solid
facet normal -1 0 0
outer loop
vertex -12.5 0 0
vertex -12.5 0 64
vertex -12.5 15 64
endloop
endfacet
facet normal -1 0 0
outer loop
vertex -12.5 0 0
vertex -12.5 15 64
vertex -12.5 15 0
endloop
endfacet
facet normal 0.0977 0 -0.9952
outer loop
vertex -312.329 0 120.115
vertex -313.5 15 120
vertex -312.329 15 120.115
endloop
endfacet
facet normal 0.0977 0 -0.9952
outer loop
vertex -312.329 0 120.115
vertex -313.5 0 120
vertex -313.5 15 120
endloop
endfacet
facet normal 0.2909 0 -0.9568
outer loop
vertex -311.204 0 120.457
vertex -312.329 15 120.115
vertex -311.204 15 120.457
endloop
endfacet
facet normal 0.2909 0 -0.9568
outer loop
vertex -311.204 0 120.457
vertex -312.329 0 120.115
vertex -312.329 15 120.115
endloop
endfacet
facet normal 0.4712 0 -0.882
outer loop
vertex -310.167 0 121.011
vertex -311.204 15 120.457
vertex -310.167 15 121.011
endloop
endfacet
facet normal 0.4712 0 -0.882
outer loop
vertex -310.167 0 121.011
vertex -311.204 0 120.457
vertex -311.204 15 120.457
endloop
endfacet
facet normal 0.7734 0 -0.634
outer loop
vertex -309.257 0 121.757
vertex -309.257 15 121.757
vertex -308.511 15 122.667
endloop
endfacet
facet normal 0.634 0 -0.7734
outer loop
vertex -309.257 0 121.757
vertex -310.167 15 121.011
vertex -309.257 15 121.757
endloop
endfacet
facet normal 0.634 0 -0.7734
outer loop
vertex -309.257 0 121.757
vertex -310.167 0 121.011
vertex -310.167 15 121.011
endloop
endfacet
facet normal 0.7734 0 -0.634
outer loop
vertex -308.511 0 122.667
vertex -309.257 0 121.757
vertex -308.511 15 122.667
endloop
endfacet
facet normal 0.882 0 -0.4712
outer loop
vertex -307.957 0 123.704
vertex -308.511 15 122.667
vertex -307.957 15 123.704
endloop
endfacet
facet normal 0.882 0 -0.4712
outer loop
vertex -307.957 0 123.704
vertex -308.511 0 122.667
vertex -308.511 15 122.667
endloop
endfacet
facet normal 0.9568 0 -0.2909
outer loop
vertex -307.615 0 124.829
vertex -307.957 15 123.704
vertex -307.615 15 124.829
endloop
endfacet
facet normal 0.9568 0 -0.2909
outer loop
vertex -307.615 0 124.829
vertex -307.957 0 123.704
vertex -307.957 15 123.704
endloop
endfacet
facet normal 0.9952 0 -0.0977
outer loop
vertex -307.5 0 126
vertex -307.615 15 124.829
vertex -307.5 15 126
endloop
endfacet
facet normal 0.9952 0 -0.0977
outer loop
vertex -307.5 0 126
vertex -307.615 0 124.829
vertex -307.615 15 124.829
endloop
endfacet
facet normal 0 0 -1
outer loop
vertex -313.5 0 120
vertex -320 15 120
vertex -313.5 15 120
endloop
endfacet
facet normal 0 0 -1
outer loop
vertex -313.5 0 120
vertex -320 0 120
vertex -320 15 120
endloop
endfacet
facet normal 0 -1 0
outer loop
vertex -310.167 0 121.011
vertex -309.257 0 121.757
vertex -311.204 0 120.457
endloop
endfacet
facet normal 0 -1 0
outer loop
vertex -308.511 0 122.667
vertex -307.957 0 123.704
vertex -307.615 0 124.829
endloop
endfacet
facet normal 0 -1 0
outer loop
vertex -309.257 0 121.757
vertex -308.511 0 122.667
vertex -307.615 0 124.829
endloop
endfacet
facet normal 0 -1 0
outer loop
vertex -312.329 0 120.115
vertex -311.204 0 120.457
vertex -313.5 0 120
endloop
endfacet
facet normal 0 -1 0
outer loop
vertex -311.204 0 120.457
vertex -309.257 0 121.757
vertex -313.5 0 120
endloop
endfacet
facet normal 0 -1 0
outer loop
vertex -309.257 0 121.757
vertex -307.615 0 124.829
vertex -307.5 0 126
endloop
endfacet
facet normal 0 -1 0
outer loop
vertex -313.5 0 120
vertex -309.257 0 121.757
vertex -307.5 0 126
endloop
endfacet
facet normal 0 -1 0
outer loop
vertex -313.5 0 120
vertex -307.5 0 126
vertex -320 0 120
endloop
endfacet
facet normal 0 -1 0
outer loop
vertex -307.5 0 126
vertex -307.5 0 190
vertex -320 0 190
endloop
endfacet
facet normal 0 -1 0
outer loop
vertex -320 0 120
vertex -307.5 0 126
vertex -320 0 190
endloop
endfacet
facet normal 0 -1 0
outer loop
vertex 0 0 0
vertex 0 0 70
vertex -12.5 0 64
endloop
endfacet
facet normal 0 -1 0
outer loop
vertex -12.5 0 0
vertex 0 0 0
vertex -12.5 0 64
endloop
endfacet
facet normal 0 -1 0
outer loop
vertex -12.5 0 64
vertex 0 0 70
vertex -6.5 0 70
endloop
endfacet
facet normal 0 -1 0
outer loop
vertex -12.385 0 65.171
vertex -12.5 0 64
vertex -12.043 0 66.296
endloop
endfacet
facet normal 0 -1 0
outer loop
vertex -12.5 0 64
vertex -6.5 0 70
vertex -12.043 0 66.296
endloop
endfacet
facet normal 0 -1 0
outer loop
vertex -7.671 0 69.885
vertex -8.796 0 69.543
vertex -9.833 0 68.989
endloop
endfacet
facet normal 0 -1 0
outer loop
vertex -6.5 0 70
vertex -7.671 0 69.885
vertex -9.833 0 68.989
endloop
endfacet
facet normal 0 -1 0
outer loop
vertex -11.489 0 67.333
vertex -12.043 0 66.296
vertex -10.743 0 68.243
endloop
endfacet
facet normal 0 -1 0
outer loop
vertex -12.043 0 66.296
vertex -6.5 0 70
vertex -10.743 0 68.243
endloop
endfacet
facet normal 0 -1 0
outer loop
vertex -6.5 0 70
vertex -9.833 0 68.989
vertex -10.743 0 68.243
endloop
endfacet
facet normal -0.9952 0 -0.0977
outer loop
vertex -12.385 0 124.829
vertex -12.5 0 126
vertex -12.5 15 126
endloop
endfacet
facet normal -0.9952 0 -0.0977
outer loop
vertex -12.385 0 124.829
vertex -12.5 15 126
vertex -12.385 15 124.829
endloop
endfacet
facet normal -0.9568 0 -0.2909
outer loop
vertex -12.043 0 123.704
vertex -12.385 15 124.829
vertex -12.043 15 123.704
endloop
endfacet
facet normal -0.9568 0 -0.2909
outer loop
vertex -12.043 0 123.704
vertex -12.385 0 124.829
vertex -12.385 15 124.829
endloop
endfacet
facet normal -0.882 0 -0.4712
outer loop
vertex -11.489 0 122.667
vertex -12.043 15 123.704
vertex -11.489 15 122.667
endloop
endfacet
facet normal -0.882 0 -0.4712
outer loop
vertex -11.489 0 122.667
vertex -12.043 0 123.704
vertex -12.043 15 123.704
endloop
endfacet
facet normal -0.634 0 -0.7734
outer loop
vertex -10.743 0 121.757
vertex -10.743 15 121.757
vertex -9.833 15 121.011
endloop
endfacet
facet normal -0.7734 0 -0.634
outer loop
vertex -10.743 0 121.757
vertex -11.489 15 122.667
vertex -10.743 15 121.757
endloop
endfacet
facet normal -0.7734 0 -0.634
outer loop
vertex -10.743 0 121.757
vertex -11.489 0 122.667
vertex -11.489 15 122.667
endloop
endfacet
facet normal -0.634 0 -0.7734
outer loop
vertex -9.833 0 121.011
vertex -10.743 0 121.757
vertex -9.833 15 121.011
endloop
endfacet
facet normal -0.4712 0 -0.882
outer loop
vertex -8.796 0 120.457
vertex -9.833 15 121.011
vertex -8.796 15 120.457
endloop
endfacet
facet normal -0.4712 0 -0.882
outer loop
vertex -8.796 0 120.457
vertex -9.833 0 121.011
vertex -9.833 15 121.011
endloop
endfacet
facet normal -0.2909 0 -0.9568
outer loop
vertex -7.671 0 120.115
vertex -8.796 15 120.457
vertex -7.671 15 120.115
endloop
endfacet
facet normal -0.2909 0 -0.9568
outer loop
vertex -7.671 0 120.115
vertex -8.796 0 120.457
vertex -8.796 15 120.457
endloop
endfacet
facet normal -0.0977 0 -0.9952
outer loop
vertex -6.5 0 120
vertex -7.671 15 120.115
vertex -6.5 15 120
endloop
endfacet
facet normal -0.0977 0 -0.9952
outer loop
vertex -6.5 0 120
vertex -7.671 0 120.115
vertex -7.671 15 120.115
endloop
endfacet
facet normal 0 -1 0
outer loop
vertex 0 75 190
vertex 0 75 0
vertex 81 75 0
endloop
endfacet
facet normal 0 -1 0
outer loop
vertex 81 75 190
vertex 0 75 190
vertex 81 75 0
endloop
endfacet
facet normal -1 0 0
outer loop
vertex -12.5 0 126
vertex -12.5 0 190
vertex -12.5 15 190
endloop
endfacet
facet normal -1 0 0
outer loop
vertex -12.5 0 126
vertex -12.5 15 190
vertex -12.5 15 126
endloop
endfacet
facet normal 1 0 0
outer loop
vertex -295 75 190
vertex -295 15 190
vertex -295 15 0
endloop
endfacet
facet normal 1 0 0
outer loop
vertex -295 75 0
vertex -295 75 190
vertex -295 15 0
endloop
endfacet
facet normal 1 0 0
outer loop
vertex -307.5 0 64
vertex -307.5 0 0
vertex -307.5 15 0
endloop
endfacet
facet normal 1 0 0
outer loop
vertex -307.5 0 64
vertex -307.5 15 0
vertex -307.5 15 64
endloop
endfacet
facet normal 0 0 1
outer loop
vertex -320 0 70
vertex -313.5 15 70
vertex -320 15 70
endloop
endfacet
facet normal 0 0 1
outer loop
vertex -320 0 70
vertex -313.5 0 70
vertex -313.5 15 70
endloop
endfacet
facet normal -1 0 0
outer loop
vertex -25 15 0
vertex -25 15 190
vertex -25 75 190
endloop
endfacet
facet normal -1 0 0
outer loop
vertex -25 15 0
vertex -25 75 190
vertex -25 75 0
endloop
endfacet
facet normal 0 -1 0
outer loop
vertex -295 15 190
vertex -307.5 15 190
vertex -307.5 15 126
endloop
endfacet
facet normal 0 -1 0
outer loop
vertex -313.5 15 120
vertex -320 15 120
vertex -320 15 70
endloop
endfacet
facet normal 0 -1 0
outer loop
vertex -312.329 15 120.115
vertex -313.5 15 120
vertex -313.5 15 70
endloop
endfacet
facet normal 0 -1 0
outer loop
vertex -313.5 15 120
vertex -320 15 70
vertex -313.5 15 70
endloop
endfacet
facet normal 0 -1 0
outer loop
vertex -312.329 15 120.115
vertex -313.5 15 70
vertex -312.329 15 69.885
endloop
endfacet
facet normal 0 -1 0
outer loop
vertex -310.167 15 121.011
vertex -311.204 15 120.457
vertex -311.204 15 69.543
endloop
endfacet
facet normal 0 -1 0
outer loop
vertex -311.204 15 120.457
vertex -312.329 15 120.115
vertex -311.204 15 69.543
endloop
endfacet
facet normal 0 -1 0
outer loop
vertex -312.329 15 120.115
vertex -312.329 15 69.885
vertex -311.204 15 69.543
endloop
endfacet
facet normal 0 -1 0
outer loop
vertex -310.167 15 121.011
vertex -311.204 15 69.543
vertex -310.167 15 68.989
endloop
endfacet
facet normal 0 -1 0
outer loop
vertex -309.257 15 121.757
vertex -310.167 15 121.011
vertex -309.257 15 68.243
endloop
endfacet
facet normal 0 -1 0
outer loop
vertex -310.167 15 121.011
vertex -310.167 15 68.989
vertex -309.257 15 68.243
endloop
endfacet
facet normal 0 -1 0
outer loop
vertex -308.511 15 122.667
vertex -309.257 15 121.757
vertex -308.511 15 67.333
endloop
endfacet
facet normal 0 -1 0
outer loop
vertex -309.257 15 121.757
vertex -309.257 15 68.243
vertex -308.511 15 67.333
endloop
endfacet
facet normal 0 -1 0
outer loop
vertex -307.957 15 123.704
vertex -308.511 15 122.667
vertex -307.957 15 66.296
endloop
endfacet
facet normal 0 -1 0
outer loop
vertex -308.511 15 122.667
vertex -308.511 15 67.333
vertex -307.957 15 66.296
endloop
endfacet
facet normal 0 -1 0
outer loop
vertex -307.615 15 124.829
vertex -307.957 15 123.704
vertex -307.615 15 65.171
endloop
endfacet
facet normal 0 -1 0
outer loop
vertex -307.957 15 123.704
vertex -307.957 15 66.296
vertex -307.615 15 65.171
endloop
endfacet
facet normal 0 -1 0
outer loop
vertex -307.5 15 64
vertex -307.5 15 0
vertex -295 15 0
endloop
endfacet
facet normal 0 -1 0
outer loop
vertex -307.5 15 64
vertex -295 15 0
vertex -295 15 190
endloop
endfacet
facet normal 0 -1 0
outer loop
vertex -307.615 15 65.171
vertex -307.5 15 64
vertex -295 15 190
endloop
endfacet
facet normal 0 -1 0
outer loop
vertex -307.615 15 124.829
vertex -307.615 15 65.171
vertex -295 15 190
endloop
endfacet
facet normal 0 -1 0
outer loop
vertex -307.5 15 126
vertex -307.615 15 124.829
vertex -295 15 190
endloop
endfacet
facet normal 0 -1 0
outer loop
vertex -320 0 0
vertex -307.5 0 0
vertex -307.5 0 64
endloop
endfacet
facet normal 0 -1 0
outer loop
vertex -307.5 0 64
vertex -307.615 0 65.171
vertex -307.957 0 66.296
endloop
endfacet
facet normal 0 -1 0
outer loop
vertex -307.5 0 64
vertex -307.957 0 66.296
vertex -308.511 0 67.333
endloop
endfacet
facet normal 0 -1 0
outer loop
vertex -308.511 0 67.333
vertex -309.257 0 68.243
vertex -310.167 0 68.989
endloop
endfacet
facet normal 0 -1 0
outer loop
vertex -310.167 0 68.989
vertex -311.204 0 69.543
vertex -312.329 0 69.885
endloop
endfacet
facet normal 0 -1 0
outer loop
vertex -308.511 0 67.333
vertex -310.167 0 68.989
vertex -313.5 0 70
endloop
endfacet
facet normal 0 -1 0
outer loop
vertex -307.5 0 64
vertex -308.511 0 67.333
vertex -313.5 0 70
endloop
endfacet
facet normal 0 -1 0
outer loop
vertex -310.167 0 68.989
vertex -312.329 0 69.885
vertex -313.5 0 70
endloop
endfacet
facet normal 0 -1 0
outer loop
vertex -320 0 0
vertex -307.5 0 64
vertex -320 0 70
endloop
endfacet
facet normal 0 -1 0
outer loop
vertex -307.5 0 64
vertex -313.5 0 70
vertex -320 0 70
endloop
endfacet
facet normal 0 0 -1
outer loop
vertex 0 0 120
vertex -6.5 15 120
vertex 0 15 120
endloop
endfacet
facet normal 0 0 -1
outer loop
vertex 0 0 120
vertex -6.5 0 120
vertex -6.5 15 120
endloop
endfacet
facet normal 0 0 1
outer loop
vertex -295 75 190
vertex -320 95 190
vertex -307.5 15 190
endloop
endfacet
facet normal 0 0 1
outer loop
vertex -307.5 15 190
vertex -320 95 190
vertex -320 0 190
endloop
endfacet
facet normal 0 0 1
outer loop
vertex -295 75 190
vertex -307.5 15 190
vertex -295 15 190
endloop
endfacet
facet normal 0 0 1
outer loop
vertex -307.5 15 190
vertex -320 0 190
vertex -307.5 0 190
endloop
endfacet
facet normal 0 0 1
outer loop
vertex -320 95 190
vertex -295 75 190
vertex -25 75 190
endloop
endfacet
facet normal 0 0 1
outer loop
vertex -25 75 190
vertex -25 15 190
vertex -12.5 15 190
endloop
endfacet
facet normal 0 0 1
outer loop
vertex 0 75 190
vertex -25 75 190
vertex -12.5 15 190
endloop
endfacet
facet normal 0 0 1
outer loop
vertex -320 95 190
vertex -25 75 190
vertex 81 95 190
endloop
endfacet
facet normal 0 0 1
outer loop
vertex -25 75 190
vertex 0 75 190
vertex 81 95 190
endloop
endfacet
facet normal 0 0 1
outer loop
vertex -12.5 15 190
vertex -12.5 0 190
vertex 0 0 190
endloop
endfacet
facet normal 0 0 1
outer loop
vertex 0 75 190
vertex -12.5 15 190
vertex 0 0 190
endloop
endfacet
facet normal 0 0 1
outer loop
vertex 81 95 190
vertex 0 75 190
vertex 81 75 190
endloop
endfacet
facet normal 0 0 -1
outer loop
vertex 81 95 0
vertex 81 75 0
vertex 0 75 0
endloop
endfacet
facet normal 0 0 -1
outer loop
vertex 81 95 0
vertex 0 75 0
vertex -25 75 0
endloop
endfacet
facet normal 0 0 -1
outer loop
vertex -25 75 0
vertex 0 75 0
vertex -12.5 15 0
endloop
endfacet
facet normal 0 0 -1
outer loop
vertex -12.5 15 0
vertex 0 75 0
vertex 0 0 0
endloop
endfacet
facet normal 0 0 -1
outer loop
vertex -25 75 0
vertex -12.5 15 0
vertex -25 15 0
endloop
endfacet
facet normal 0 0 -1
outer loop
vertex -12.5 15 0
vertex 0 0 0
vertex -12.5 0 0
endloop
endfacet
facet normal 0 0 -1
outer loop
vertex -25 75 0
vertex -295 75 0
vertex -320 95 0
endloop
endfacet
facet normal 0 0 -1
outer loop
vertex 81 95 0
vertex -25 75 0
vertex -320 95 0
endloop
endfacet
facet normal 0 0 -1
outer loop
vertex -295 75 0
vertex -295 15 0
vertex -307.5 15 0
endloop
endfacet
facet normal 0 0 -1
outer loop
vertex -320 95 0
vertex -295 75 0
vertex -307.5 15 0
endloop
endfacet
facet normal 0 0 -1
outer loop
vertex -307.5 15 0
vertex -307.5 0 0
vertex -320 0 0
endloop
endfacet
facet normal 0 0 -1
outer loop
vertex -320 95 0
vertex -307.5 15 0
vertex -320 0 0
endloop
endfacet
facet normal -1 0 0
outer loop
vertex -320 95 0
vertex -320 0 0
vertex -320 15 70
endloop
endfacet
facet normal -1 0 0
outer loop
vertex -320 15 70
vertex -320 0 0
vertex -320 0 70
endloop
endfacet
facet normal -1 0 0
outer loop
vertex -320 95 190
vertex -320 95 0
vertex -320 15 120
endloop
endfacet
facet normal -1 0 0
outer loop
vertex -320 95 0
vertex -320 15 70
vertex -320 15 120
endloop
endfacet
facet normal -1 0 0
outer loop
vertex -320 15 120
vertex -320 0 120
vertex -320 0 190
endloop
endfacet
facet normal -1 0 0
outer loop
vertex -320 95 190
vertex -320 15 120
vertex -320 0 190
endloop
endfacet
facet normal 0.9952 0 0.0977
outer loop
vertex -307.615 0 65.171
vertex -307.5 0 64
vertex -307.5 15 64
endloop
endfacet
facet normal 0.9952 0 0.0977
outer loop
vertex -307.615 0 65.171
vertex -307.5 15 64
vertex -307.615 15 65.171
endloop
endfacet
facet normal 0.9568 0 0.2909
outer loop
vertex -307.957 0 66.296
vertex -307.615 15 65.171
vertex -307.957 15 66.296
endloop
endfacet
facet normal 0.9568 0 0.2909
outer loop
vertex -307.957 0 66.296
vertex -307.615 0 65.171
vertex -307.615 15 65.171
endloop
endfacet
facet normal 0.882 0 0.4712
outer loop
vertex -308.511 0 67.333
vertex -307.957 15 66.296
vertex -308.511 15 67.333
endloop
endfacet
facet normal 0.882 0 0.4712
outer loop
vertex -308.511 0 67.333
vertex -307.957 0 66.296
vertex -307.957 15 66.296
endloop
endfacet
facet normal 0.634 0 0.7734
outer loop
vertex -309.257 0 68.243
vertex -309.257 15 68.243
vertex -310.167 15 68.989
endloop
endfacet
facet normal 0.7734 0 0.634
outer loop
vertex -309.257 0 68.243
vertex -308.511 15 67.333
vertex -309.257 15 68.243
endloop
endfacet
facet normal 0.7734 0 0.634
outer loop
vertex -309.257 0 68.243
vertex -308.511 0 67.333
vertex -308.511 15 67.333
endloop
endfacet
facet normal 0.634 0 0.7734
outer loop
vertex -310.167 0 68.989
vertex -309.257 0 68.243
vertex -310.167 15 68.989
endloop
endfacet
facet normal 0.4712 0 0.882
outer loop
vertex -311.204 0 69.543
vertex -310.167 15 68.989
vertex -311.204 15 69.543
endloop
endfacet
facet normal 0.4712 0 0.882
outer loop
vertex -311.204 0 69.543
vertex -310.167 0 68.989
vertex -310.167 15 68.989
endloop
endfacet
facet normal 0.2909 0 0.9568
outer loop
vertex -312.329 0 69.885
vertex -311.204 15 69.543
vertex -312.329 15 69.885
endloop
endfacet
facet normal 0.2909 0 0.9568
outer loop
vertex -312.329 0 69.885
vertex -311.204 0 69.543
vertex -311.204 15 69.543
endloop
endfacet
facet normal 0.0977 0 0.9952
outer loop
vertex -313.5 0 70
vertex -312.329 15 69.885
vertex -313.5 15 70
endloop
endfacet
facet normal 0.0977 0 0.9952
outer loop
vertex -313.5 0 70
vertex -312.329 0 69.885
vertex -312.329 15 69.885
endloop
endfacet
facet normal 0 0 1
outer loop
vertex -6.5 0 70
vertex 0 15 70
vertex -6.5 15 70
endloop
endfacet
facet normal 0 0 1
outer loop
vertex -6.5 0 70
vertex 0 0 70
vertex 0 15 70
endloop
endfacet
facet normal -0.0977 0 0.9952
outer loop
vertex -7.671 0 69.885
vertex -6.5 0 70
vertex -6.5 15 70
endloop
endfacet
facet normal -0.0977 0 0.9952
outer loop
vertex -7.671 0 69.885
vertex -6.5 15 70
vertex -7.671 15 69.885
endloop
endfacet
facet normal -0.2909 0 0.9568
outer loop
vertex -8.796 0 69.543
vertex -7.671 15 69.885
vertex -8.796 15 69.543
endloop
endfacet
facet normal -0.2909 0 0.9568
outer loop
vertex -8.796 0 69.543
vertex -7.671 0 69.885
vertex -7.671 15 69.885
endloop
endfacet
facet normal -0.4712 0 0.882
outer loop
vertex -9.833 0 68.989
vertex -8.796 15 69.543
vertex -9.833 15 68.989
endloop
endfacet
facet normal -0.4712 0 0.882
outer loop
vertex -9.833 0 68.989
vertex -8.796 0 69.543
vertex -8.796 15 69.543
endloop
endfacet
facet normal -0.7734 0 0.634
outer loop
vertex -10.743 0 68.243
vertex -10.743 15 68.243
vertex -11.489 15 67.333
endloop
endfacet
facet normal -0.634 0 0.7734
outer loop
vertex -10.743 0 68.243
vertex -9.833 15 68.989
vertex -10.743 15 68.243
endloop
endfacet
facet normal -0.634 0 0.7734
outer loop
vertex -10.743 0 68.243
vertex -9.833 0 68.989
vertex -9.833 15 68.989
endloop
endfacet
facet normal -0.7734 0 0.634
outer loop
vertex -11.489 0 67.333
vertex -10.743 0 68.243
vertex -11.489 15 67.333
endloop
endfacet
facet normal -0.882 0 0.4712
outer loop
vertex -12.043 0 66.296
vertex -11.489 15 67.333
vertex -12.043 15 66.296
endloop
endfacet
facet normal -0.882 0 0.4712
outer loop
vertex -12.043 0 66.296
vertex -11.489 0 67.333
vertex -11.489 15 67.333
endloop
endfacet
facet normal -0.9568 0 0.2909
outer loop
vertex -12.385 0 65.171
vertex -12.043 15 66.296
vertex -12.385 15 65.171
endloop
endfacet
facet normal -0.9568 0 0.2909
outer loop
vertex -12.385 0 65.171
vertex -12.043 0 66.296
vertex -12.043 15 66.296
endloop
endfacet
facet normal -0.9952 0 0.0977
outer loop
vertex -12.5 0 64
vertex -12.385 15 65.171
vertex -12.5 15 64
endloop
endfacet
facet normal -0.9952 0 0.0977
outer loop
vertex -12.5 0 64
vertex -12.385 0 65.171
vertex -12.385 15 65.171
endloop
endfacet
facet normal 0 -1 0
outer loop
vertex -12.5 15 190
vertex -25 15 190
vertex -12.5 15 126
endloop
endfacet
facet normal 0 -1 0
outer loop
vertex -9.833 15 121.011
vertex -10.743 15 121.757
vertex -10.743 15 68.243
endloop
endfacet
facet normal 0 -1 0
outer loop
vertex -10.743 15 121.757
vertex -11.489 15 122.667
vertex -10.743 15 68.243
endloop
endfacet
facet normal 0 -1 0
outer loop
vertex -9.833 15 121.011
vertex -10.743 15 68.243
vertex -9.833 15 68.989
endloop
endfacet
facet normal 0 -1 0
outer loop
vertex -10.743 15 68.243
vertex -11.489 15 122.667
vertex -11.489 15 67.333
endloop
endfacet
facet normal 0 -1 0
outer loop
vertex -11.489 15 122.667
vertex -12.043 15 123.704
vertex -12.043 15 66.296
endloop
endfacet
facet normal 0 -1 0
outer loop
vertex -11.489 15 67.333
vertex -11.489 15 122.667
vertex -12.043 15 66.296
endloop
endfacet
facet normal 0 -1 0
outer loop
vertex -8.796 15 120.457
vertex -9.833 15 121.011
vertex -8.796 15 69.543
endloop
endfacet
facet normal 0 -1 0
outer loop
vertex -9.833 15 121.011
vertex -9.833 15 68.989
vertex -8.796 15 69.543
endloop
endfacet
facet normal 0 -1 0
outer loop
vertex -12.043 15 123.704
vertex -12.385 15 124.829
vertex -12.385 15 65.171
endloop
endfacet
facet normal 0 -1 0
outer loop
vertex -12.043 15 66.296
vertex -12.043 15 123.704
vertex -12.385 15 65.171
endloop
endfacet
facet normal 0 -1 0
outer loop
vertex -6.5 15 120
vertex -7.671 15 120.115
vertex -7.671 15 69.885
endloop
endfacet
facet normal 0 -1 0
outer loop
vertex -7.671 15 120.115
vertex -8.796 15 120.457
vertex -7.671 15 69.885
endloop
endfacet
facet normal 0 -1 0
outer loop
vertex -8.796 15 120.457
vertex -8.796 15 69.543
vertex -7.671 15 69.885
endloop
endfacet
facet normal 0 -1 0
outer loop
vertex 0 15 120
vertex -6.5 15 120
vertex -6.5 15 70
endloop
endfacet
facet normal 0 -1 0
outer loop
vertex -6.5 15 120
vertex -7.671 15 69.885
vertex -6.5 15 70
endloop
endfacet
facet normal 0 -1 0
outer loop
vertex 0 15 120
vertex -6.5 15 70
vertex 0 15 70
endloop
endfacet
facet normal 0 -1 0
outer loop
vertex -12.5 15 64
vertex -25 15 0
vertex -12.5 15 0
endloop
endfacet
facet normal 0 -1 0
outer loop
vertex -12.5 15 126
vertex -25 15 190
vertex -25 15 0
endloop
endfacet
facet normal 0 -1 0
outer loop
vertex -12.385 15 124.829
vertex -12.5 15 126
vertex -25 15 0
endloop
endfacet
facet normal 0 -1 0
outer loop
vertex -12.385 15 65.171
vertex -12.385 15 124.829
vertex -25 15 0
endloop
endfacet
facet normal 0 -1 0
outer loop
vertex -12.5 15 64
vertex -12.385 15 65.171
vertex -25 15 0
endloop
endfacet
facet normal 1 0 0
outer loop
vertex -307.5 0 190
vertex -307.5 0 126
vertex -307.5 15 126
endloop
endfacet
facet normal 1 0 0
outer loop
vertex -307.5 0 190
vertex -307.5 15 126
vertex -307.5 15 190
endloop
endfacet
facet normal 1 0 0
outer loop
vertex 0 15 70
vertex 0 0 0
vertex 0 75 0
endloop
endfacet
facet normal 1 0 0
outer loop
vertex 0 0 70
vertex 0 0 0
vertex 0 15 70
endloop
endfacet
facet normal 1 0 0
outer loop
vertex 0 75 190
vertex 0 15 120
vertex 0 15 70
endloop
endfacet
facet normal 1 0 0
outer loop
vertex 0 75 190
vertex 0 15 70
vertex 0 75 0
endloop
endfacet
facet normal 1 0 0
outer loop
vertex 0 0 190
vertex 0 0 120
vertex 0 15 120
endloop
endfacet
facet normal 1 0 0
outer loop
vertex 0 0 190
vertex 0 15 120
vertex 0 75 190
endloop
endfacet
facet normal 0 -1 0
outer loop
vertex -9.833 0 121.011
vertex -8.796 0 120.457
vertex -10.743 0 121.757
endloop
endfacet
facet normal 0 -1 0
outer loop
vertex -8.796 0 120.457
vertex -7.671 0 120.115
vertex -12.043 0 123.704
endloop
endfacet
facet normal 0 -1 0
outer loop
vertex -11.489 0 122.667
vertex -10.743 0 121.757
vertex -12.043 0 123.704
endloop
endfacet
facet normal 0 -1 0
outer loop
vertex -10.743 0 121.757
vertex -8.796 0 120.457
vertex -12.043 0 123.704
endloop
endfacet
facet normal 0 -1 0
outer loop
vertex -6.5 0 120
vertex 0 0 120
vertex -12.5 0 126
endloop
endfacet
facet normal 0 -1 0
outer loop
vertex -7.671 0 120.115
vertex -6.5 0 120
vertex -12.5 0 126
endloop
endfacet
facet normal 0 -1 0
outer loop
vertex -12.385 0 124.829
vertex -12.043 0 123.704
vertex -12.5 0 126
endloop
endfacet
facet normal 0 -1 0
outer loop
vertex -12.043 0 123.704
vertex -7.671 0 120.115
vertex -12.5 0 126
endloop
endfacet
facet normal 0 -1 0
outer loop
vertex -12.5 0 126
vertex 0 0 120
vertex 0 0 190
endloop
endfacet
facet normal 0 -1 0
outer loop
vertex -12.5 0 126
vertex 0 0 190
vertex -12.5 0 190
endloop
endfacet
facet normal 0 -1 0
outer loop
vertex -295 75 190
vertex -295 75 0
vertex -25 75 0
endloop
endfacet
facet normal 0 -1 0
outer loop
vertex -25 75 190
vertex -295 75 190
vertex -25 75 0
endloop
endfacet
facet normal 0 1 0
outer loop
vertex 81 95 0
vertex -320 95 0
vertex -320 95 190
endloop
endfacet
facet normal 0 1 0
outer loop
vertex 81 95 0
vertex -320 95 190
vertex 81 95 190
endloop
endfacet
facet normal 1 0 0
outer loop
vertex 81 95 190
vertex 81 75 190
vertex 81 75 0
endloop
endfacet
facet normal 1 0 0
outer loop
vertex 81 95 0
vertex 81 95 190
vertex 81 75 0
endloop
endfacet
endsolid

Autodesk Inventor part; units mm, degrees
ref_plane "YZ Plane" through (0, 0, 0) normal (1, 0, 0) x (0, 1, 0)
ref_plane "XZ Plane" through (0, 0, 0) normal (0, 1, 0) x (-1, 0, 0)
ref_plane "XY Plane" through (0, 0, 0) normal (0, 0, 1) x (1, 0, 0)
sketch "Эскиз1" plane through (0, 0, 0) normal (0, 1, 0) x (-1, 0, 0)
  arc A0 (313.5, 70) -> (307.5, 64) centre (313.5, 64) ccw
  line L0 (307.5, 0) -> (307.5, 64)
  line L1 (320, 0) -> (307.5, 0)
  line L2 (320, 70) -> (320, 0)
  line L3 (313.5, 70) -> (320, 70)
  arc A1 (307.5, 126) -> (313.5, 120) centre (313.5, 126) ccw
  line L4 (320, 120) -> (313.5, 120)
  line L5 (320, 190) -> (320, 120)
  line L6 (307.5, 190) -> (320, 190)
  line L7 (307.5, 126) -> (307.5, 190)
  arc A2 (6.5, 120) -> (12.5, 126) centre (6.5, 126) ccw
  line L8 (12.5, 190) -> (12.5, 126)
  line L9 (0, 190) -> (12.5, 190)
  line L10 (0, 120) -> (0, 190)
  line L11 (6.5, 120) -> (0, 120)
  line L12 (12.5, 64) -> (12.5, 0)
  arc A3 (12.5, 64) -> (6.5, 70) centre (6.5, 64) ccw
  line L13 (0, 70) -> (6.5, 70)
  line L14 (0, 0) -> (0, 70)
  line L15 (12.5, 0) -> (0, 0)
  line L16 (12.5, 64) -> (12.5, 0)
  point P0 (144, 0)
extrude "Выдавливание1" add sketch "Эскиз1" along normal blind 15
sketch "Эскиз2" plane through (0, 15, 0) normal (0, 1, 0) x (1, 0, 0)
  line L0 (-320, -120) -> (-320, -190) projected
  line L1 (-320, -190) -> (-295, -190)
  line L2 (-295, -190) -> (-295, 0)
  line L3 (-295, 0) -> (-320, 0)
  line L4 (-320, 0) -> (-320, -190)
  line L5 (0, -190) -> (0, -120) projected
  line L6 (0, -190) -> (-25, -190)
  line L7 (-25, -190) -> (-25, 0)
  line L8 (-25, 0) -> (0, 0)
  line L9 (0, 0) -> (0, -190)
  point P0 (0, 0)
  dimension "d2" = 25
  dimension "d3" = 25
extrude "Выдавливание2" add sketch "Эскиз2" along normal blind 60
sketch "Эскиз3" plane through (0, 75, 0) normal (0, 1, 0) x (1, 0, 0)
  line L0 (-320, 0) -> (-320, -190) projected
  line L1 (-320, -190) -> (81, -190)
  line L2 (81, -190) -> (81, 0)
  line L3 (81, 0) -> (-320, 0)
  line L4 (-320, 0) -> (-320, -190)
  point P0 (0, 0)
extrude "Выдавливание3" add sketch "Эскиз3" along normal blind 20
properties part number "BackPlate"
